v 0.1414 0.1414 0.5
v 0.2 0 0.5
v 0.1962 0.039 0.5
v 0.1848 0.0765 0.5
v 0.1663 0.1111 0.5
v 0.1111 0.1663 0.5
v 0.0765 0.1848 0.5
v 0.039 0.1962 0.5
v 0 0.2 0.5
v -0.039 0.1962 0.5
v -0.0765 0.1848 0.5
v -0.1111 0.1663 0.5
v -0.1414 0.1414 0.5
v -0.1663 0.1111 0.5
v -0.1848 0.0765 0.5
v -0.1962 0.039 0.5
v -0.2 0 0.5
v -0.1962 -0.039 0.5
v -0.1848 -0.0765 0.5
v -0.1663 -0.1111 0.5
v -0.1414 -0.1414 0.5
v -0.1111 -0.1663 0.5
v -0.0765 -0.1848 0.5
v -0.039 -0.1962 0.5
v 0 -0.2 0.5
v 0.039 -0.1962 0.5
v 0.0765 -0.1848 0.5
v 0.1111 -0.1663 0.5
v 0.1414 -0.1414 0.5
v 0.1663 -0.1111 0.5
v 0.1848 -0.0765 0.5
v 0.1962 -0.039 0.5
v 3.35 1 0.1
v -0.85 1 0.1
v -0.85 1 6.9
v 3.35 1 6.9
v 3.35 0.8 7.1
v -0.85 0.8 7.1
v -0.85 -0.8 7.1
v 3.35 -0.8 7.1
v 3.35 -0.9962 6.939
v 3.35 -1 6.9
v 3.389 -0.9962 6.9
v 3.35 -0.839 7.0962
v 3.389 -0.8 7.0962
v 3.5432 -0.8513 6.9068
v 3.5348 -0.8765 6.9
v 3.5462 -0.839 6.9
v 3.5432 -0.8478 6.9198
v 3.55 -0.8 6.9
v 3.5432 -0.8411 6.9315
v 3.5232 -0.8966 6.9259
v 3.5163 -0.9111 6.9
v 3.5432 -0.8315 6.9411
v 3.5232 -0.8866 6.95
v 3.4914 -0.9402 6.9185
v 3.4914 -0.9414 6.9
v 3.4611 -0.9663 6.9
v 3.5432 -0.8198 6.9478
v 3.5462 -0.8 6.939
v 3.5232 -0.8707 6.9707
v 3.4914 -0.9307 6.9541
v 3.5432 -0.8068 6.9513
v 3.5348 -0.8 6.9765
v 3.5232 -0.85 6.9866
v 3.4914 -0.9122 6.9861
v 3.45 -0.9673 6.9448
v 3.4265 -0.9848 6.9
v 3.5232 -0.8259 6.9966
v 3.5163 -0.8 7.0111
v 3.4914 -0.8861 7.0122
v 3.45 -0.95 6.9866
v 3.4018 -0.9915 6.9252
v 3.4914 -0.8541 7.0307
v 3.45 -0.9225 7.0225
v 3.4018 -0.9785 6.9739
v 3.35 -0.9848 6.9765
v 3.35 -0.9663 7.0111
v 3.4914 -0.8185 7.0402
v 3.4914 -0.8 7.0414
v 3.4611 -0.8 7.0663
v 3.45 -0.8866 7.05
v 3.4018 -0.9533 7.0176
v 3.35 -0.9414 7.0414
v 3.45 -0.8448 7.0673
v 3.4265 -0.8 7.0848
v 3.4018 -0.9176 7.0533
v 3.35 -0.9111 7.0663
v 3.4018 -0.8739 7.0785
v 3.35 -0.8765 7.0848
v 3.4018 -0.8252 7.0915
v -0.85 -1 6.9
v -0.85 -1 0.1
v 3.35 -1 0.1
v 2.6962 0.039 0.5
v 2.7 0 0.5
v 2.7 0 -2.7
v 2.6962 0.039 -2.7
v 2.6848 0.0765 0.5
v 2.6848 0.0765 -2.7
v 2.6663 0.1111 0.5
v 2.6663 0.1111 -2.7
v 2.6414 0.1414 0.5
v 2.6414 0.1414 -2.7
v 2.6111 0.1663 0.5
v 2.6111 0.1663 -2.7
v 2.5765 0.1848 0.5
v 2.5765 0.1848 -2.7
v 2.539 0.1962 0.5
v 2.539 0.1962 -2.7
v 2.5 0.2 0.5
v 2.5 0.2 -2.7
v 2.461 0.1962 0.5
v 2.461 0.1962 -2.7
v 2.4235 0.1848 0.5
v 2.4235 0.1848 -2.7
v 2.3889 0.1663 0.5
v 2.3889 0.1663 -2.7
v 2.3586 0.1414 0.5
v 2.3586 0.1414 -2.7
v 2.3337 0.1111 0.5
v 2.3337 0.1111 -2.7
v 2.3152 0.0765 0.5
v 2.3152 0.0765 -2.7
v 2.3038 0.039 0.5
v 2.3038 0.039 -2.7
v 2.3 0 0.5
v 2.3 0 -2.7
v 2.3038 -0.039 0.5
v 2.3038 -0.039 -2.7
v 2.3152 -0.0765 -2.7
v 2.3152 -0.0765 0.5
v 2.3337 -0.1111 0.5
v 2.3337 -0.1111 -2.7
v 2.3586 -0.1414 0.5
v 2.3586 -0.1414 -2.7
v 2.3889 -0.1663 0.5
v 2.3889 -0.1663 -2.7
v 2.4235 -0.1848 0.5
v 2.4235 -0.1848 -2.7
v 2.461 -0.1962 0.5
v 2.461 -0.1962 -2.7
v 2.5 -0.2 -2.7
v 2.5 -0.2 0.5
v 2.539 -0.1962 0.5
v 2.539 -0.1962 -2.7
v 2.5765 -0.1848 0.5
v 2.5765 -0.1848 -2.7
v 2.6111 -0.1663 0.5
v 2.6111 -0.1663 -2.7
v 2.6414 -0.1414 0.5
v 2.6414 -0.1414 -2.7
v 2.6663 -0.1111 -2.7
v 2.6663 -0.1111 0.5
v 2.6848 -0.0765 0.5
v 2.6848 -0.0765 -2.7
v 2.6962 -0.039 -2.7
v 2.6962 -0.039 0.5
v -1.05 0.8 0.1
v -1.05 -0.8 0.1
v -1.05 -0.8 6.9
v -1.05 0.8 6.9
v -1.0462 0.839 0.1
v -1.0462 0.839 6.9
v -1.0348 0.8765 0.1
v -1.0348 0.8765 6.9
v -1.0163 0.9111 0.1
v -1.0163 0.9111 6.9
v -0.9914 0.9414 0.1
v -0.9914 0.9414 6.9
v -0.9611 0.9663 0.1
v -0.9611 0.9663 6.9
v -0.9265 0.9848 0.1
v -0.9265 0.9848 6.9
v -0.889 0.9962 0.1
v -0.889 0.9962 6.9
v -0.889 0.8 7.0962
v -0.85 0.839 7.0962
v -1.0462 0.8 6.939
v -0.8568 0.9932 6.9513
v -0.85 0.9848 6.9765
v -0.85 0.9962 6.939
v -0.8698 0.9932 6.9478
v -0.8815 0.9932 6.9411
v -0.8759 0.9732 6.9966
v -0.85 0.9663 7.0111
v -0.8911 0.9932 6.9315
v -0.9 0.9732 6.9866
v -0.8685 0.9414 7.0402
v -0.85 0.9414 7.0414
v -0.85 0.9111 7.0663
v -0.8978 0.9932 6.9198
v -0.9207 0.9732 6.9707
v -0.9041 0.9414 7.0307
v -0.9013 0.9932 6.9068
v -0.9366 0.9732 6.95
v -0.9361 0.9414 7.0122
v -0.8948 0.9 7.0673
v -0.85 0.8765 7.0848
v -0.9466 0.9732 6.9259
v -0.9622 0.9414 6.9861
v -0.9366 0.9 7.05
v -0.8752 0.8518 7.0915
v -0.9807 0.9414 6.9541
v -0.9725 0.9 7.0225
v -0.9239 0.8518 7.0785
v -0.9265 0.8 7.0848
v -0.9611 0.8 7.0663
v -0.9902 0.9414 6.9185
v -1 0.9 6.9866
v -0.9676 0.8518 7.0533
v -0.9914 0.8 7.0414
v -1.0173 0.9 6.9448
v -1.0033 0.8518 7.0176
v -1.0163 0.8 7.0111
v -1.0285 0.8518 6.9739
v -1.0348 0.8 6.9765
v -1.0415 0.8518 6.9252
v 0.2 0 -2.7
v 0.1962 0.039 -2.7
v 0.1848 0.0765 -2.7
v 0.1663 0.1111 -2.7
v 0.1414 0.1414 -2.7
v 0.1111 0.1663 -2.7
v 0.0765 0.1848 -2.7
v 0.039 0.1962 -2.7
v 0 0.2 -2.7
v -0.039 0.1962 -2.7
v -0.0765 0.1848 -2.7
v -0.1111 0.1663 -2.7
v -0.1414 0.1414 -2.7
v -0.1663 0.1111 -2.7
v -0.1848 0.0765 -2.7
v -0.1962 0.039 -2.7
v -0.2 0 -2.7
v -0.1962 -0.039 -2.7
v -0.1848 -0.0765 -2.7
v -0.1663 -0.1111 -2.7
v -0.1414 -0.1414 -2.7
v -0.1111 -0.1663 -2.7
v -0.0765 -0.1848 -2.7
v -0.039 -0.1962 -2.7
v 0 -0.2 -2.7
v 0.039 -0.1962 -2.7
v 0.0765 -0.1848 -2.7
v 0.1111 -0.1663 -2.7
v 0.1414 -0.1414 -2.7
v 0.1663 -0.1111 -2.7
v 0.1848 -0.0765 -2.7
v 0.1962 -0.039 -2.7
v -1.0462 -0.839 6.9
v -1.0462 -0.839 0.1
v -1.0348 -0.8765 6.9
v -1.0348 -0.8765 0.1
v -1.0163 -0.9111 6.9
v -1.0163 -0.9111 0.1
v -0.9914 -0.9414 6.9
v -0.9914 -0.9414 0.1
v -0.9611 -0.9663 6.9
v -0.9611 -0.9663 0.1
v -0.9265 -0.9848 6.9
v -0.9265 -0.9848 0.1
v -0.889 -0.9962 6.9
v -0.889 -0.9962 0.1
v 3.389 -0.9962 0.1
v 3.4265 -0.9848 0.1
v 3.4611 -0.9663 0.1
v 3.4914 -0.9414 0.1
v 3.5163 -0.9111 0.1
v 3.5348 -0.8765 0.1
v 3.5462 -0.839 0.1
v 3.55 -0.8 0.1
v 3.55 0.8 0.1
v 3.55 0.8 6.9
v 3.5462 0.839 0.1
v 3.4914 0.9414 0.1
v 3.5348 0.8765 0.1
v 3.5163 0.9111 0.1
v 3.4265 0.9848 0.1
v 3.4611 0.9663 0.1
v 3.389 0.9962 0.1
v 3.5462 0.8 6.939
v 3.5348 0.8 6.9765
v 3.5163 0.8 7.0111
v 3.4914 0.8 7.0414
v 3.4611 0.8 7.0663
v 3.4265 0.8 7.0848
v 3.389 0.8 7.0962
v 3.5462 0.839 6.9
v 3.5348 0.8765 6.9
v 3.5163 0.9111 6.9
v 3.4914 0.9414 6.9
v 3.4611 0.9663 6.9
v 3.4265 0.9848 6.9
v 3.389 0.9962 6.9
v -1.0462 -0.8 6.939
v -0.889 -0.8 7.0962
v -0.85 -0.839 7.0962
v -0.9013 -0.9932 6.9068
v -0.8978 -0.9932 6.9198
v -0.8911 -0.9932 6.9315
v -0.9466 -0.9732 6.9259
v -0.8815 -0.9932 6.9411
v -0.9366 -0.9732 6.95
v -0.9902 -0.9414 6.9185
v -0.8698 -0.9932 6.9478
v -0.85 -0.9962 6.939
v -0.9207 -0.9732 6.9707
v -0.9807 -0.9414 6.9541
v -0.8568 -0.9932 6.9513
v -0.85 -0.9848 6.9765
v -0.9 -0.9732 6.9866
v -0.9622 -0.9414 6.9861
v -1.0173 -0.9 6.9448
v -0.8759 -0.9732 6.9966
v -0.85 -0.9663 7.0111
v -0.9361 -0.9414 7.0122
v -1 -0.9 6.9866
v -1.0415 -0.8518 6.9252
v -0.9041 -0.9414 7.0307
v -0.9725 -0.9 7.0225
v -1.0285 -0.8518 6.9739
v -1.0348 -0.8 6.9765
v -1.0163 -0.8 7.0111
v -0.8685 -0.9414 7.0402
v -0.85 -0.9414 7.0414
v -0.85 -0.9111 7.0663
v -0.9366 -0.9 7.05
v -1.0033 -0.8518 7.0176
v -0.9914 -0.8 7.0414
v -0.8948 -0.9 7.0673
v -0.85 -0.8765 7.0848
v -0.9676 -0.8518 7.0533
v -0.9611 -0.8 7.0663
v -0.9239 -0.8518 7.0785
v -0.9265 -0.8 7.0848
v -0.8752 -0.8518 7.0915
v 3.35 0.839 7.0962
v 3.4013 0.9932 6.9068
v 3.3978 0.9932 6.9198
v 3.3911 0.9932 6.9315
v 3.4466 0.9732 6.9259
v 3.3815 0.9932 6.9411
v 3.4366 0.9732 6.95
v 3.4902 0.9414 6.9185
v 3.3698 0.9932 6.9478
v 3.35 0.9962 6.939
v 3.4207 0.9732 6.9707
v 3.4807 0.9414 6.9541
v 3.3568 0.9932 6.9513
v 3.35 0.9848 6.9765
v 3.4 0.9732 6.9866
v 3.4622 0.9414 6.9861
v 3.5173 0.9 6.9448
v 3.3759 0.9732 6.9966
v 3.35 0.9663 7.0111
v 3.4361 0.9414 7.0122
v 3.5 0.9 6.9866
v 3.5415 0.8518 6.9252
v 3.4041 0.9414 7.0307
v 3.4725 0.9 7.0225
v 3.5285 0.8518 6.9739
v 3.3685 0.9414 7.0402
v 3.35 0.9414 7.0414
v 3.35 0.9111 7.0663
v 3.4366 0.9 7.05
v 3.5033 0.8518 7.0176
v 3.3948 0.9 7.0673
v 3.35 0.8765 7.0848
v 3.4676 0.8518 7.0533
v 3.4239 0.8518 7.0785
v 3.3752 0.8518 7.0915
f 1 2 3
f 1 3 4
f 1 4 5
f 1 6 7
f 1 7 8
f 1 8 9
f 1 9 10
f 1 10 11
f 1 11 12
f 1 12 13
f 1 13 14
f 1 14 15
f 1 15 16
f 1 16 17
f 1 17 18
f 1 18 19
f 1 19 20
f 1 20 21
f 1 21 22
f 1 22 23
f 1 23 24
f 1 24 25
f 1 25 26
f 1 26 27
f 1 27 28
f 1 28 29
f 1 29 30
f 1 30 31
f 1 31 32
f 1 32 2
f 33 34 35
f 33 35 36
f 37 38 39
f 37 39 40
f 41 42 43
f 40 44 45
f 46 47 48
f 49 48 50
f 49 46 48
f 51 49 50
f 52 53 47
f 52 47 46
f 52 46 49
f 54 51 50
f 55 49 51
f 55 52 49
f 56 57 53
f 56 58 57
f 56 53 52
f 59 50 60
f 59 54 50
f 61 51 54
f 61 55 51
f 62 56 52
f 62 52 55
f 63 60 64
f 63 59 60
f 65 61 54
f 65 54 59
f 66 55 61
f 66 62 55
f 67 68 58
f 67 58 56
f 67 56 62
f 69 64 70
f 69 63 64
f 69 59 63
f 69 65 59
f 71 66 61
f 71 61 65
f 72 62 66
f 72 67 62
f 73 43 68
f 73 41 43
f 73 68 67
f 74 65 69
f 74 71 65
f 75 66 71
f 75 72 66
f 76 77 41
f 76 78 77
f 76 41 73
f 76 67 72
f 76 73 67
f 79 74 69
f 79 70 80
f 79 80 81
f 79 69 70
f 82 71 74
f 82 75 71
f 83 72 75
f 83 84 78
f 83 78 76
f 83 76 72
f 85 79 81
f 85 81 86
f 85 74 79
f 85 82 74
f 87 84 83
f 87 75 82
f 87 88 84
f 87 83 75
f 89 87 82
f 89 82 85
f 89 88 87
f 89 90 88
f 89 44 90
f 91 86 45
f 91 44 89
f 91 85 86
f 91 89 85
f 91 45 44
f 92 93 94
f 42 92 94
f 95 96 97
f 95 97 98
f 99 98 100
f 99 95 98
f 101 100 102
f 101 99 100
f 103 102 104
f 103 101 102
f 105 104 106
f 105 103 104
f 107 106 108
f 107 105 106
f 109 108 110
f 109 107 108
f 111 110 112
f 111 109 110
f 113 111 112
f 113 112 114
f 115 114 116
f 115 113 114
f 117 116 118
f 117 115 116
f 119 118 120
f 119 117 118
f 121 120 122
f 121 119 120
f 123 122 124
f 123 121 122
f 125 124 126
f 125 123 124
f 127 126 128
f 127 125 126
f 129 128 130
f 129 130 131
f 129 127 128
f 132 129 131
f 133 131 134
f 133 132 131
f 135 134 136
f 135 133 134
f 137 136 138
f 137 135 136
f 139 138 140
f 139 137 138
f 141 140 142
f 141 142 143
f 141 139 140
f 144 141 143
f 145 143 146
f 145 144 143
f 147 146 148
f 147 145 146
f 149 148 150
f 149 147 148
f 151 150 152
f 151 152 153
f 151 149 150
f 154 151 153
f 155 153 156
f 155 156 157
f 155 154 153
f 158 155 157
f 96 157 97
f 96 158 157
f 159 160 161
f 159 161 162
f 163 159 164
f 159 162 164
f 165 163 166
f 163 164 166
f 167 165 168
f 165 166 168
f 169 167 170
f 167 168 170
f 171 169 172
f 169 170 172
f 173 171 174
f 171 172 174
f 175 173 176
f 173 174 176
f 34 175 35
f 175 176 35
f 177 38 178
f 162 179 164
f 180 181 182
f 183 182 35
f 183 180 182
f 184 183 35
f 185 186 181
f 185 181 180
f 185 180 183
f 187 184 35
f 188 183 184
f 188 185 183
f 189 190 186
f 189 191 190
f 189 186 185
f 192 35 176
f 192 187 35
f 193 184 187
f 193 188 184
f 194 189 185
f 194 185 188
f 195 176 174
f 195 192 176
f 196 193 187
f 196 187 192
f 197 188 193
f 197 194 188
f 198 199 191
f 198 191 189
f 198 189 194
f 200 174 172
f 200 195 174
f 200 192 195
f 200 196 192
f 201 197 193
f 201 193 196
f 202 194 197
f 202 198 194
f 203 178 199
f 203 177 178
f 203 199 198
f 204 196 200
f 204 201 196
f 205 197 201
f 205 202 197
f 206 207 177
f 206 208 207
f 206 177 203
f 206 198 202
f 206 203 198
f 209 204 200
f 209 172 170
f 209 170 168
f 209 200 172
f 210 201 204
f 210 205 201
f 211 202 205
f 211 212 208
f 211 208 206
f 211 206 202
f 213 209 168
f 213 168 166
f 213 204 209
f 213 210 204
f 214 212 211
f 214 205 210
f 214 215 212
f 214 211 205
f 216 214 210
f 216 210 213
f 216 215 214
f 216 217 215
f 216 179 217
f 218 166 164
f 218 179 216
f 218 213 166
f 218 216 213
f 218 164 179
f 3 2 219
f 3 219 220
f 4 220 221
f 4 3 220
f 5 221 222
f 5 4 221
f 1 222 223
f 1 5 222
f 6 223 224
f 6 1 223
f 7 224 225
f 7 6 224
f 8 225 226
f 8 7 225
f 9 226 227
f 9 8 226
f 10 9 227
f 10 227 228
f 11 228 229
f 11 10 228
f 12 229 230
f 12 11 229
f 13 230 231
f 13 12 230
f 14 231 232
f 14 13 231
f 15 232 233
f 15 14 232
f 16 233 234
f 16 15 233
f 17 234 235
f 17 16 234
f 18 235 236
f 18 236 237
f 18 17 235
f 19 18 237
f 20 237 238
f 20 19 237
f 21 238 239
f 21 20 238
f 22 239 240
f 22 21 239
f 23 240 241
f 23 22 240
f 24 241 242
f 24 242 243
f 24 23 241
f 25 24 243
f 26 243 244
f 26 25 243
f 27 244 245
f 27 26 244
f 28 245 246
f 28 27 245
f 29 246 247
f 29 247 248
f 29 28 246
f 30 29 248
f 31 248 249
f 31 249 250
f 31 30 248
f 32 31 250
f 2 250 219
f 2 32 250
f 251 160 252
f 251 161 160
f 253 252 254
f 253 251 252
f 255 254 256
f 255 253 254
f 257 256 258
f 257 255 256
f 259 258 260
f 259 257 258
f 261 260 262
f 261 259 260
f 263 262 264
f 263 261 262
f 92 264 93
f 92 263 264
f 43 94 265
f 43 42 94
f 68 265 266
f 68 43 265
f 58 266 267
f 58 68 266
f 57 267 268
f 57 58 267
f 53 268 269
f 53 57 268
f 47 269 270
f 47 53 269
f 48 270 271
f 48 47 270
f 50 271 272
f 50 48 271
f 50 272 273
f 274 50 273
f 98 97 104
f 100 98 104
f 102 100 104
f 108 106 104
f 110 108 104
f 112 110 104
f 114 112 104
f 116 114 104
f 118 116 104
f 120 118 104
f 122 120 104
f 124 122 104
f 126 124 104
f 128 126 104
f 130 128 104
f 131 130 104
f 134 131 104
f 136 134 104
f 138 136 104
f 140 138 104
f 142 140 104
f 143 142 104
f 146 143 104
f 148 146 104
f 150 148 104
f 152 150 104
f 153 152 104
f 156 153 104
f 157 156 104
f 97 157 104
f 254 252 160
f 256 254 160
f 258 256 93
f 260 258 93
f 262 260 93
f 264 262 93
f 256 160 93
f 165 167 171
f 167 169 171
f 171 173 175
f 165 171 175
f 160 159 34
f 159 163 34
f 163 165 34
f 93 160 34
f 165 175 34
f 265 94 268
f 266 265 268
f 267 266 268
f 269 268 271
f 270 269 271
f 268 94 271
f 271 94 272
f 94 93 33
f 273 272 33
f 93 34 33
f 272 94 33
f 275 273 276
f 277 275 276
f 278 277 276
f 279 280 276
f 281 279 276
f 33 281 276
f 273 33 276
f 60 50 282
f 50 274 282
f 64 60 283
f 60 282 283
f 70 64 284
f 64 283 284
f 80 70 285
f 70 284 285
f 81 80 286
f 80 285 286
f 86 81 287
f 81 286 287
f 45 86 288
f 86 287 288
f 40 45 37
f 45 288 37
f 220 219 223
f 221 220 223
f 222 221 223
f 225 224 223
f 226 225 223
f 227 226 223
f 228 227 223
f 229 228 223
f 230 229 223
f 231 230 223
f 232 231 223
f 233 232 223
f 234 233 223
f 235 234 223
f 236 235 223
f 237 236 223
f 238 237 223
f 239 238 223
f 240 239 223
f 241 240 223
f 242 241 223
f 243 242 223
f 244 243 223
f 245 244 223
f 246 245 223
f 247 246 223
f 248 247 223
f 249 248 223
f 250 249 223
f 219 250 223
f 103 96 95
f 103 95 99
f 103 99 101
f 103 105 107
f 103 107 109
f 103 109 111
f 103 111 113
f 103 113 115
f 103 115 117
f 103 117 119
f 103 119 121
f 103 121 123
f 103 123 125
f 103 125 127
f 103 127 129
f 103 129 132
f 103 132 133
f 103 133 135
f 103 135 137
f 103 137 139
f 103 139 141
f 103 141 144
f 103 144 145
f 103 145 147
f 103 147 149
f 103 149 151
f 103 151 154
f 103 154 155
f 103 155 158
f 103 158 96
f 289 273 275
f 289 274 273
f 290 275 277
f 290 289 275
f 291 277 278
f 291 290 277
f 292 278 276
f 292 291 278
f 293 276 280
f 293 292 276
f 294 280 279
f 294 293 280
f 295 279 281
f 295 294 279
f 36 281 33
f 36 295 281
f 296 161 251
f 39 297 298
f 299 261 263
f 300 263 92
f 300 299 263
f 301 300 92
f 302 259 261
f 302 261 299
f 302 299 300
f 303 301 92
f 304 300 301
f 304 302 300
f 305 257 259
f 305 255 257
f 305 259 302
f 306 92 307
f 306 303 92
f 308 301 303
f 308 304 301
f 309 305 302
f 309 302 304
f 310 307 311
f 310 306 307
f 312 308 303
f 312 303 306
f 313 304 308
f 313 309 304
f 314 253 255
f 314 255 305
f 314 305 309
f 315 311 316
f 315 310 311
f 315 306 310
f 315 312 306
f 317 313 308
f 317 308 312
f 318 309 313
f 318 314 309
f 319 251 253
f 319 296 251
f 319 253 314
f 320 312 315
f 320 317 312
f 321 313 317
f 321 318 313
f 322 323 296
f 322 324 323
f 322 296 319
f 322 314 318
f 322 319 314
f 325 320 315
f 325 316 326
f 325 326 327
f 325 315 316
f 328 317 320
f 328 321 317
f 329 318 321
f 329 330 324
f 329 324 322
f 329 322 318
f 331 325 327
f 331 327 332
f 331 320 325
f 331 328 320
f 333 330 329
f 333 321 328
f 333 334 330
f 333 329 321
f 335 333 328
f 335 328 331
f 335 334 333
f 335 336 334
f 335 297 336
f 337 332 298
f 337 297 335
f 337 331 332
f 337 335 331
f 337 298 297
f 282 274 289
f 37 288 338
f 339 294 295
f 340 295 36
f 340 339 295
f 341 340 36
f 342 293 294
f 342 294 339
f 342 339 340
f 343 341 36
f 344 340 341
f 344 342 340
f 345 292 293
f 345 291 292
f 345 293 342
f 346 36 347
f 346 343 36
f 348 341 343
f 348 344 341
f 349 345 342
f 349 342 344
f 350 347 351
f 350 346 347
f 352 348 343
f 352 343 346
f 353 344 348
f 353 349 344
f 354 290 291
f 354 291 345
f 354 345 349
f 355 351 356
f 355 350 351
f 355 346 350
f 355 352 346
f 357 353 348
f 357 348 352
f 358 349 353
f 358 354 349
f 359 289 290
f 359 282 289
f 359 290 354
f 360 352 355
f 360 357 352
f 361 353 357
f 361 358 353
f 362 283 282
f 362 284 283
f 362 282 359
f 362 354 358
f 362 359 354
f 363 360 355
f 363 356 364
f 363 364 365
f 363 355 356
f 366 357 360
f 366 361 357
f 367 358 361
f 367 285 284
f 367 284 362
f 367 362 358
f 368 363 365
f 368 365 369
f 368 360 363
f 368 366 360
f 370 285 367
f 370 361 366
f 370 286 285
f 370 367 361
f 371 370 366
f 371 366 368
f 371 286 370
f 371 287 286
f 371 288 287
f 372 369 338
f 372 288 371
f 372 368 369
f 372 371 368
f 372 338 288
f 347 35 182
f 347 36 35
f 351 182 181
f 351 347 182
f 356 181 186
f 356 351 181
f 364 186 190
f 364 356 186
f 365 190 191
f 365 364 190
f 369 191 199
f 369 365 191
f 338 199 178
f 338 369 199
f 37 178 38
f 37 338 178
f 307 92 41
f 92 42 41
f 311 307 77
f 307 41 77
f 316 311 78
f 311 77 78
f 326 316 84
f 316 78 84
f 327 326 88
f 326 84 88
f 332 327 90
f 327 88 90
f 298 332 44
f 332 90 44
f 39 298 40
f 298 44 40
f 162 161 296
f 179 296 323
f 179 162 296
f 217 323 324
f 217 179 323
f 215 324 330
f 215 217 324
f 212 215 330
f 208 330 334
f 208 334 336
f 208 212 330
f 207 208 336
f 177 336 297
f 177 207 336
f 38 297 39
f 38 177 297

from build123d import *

# Parameters (mm, degrees)
SKETCH_W     = 4.6
SKETCH_H     = 2
PAD_DEPTH    = 7
FILLET_R     = 0.2
SKETCH001_R  = 0.2
PAD001_DEPTH = 3.2


with BuildPart() as fillet_body:
    # Sketch → Pad (new body)
    with BuildSketch(Plane.XY.offset(0.1)):
        with Locations((1.25, 0)):
            Rectangle(SKETCH_W, SKETCH_H)
    extrude(amount=PAD_DEPTH)

    # Fillet
    fillet_edges = [fillet_body.edges().sort_by_distance(p)[0] for p in [
        (-1.05, 0, 7.1),
        (-1.05, -1, 3.6),
        (1.25, -1, 7.1),
        (3.55, -1, 3.6),
        (3.55, 0, 7.1),
        (3.55, 1, 3.6),
        (1.25, 1, 7.1),
        (-1.05, 1, 3.6),
    ]]
    fillet(fillet_edges, radius=FILLET_R)


with BuildPart() as pad001:
    # Sketch001 → Pad001 (new body)
    with BuildSketch(Plane.XY.offset(0.5)):
        Circle(SKETCH001_R)
        with Locations((2.5, 0)):
            Circle(SKETCH001_R)
    extrude(amount=-PAD001_DEPTH)


solid = Compound([fillet_body.part, pad001.part])
